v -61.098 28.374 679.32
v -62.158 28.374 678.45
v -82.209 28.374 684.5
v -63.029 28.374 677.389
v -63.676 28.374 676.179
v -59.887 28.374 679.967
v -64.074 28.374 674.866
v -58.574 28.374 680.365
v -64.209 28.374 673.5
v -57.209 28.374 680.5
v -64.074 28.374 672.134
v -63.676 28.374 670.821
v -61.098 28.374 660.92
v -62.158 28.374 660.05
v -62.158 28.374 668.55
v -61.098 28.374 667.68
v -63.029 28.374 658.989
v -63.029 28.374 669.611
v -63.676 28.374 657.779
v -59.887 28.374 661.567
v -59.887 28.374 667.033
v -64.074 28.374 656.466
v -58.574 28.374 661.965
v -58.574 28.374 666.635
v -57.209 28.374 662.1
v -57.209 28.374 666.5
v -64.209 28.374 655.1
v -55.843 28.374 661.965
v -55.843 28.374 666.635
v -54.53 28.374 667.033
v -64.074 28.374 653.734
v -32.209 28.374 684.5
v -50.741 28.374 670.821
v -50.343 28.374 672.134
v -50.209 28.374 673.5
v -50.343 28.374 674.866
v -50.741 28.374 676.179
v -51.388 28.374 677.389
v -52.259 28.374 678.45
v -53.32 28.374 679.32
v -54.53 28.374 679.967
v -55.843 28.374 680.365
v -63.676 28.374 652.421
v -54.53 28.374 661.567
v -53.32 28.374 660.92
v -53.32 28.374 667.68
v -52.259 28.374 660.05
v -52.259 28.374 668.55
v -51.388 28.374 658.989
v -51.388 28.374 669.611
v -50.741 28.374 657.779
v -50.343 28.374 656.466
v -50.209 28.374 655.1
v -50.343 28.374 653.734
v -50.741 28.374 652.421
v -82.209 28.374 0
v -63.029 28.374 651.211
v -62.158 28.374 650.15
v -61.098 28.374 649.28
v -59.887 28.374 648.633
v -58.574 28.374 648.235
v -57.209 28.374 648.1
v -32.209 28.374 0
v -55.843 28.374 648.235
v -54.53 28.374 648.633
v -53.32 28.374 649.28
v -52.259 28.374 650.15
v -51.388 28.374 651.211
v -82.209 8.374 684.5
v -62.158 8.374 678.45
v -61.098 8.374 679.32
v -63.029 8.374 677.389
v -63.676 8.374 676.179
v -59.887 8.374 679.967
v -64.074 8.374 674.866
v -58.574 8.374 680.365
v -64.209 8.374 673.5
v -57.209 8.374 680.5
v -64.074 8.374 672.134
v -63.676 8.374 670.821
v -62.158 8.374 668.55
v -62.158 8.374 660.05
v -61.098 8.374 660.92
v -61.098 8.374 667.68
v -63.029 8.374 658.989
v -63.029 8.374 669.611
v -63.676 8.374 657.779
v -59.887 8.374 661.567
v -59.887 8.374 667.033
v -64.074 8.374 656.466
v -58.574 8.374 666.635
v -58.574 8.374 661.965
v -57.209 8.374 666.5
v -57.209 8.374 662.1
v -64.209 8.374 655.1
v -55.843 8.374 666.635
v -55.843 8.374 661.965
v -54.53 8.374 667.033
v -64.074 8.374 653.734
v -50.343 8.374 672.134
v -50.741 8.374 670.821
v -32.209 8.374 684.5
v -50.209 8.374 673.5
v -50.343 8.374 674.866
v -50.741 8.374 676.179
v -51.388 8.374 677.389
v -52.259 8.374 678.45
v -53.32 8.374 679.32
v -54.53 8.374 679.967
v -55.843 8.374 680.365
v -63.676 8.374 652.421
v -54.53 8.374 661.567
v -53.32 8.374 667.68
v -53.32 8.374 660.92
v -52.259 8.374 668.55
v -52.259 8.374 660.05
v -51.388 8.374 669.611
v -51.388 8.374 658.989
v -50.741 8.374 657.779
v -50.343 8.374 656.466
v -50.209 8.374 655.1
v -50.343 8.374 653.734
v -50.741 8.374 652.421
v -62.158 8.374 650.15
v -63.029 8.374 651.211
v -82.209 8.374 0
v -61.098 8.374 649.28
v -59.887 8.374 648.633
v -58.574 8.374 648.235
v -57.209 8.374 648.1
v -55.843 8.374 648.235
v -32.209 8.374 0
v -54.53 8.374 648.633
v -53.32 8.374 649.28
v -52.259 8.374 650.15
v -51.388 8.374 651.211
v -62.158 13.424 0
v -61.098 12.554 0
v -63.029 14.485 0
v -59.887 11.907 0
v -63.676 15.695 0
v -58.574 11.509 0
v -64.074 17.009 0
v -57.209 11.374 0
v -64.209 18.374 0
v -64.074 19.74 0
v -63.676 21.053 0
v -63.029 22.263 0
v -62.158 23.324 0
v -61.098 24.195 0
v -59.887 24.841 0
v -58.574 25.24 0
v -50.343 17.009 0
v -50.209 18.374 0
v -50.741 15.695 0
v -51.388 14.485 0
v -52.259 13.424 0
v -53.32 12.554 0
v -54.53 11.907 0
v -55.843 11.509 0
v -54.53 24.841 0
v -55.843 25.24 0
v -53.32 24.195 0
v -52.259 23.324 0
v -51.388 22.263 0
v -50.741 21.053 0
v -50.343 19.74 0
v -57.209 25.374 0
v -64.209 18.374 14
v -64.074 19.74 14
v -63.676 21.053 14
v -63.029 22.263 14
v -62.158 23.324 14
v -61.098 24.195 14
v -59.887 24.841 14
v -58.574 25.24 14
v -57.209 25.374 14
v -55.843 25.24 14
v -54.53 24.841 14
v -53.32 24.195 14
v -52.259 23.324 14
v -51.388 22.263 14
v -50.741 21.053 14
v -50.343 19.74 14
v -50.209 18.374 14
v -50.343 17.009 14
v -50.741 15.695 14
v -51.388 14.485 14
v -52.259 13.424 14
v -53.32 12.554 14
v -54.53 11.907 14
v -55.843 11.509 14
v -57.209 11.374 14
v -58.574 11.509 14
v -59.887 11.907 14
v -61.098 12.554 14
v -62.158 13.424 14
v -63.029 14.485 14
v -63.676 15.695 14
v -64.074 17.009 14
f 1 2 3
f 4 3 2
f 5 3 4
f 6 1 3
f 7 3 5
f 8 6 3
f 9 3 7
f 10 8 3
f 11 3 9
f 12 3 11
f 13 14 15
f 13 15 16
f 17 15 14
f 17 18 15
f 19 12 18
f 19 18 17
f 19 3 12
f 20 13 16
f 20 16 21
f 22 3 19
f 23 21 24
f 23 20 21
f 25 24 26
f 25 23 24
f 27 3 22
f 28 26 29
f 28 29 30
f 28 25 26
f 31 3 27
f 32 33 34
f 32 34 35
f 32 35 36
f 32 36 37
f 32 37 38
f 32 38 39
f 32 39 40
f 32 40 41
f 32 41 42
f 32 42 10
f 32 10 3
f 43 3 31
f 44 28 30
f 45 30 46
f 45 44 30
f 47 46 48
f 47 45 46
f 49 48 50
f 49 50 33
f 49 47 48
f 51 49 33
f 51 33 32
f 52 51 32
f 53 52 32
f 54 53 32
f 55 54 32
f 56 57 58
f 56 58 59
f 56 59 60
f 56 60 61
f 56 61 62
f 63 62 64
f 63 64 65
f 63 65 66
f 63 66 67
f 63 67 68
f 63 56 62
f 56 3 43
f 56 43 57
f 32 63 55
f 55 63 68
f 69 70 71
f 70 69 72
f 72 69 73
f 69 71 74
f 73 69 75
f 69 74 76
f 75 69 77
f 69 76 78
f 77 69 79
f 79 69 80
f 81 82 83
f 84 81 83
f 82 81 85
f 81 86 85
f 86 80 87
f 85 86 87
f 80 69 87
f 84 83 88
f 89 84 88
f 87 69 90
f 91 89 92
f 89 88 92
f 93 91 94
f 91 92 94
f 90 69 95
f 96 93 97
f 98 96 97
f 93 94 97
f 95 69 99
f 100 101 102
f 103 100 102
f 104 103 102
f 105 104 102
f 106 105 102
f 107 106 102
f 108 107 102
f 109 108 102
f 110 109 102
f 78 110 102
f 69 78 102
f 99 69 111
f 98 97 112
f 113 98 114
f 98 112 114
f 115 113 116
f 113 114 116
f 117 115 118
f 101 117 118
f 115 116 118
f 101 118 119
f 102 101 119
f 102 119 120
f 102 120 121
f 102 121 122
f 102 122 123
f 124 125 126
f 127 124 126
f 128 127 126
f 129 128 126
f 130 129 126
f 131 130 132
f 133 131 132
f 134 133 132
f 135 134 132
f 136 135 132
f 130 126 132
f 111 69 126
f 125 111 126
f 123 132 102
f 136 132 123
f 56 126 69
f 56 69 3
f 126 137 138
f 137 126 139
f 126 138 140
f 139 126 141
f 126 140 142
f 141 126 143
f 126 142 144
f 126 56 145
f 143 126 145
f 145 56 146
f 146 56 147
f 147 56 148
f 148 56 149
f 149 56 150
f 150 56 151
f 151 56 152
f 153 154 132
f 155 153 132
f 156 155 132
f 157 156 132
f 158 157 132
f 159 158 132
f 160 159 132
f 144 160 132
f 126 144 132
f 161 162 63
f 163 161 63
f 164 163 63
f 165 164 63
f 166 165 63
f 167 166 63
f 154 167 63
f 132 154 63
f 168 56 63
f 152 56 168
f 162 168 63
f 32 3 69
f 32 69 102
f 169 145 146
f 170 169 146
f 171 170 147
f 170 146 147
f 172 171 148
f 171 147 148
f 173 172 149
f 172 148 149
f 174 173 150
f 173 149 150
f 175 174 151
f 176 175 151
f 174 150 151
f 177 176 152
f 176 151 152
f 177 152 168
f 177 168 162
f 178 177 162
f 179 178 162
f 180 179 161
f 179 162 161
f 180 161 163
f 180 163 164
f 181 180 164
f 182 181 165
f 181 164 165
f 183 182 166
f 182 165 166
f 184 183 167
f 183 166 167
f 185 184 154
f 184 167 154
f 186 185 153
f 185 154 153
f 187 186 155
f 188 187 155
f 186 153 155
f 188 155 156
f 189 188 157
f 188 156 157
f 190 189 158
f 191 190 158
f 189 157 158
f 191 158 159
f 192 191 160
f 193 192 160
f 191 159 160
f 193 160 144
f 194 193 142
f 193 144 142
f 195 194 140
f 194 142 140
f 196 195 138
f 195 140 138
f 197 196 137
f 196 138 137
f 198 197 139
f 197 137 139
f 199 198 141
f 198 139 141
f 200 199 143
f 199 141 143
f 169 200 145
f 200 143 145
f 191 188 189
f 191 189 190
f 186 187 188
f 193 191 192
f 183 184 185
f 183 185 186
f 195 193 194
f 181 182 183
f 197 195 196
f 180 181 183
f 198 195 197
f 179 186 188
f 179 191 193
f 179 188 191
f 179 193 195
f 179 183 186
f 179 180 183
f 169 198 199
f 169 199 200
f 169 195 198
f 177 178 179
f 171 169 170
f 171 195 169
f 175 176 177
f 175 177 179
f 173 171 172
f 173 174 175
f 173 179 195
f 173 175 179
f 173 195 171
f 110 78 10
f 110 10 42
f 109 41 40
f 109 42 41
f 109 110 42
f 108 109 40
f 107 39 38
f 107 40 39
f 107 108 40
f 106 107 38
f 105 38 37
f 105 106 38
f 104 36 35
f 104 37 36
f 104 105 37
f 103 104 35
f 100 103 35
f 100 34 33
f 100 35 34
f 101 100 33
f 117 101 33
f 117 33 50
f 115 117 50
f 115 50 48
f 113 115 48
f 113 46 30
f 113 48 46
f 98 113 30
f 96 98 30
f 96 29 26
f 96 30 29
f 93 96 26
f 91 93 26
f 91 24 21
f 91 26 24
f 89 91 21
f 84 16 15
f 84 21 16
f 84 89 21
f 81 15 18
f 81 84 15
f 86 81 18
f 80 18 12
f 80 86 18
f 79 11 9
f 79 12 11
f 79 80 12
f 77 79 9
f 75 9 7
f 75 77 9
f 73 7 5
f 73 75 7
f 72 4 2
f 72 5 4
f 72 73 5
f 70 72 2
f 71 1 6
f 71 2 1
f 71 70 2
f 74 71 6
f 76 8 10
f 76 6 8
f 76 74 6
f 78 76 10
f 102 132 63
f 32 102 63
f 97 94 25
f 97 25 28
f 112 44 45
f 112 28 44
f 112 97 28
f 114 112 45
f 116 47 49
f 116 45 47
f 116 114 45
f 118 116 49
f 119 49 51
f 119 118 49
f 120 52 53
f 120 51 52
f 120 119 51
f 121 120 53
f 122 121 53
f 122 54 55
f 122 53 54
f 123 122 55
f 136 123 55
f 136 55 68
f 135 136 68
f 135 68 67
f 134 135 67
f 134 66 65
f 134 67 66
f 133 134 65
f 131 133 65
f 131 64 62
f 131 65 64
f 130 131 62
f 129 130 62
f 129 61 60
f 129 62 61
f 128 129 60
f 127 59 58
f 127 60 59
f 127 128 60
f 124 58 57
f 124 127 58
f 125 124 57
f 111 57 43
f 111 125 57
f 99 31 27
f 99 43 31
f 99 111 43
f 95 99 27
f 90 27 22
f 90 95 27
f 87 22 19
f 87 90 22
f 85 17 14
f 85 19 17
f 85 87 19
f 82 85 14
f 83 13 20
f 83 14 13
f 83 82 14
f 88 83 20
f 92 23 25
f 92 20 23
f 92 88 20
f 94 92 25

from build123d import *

# Parameters (mm, degrees)
SKETCH2_W               = 50
SKETCH2_H               = 20
BOSS_EXTRUDE1_DEPTH     = 684.5
CUT_EXTRUDE1_DEPTH      = 690.708998128
CUT_EXTRUDE1_DEPTH_BACK = 690.708998128
SKETCH3_R               = 7
SKETCH4_R               = 7
CUT_EXTRUDE2_DEPTH      = 14


with BuildPart() as part:
    # Sketch2 → Boss-Extrude1 (new body)
    with BuildSketch(Plane.XY):
        with Locations((-57.208588957, 18.374233129)):
            Rectangle(SKETCH2_W, SKETCH2_H)
    extrude(amount=BOSS_EXTRUDE1_DEPTH)

    # Sketch3 → Cut-Extrude1 (cut, two sides: drawn at the far end of the back side and taken through both)
    with BuildSketch(Plane(origin=(0, 28.374233129, 0), x_dir=(1, 0, 0), z_dir=(0, 1, 0)).offset(-CUT_EXTRUDE1_DEPTH_BACK)):
        with Locations(Location((-57.208588957, -673.5, 0), (0, 0, 270))):
            Circle(SKETCH3_R)
        with Locations(Location((-57.208588957, -655.1, 0), (0, 0, 270))):
            Circle(SKETCH3_R)
    extrude(amount=CUT_EXTRUDE1_DEPTH + CUT_EXTRUDE1_DEPTH_BACK, mode=Mode.SUBTRACT)

    # Sketch4 → Cut-Extrude2 (cut)
    with BuildSketch(Plane(origin=(0, 0, 0), x_dir=(-1, 0, 0), z_dir=(0, 0, -1))):
        with Locations((57.208588957, 18.374233129)):
            Circle(SKETCH4_R)
    extrude(amount=-CUT_EXTRUDE2_DEPTH, mode=Mode.SUBTRACT)


solid = part.part
